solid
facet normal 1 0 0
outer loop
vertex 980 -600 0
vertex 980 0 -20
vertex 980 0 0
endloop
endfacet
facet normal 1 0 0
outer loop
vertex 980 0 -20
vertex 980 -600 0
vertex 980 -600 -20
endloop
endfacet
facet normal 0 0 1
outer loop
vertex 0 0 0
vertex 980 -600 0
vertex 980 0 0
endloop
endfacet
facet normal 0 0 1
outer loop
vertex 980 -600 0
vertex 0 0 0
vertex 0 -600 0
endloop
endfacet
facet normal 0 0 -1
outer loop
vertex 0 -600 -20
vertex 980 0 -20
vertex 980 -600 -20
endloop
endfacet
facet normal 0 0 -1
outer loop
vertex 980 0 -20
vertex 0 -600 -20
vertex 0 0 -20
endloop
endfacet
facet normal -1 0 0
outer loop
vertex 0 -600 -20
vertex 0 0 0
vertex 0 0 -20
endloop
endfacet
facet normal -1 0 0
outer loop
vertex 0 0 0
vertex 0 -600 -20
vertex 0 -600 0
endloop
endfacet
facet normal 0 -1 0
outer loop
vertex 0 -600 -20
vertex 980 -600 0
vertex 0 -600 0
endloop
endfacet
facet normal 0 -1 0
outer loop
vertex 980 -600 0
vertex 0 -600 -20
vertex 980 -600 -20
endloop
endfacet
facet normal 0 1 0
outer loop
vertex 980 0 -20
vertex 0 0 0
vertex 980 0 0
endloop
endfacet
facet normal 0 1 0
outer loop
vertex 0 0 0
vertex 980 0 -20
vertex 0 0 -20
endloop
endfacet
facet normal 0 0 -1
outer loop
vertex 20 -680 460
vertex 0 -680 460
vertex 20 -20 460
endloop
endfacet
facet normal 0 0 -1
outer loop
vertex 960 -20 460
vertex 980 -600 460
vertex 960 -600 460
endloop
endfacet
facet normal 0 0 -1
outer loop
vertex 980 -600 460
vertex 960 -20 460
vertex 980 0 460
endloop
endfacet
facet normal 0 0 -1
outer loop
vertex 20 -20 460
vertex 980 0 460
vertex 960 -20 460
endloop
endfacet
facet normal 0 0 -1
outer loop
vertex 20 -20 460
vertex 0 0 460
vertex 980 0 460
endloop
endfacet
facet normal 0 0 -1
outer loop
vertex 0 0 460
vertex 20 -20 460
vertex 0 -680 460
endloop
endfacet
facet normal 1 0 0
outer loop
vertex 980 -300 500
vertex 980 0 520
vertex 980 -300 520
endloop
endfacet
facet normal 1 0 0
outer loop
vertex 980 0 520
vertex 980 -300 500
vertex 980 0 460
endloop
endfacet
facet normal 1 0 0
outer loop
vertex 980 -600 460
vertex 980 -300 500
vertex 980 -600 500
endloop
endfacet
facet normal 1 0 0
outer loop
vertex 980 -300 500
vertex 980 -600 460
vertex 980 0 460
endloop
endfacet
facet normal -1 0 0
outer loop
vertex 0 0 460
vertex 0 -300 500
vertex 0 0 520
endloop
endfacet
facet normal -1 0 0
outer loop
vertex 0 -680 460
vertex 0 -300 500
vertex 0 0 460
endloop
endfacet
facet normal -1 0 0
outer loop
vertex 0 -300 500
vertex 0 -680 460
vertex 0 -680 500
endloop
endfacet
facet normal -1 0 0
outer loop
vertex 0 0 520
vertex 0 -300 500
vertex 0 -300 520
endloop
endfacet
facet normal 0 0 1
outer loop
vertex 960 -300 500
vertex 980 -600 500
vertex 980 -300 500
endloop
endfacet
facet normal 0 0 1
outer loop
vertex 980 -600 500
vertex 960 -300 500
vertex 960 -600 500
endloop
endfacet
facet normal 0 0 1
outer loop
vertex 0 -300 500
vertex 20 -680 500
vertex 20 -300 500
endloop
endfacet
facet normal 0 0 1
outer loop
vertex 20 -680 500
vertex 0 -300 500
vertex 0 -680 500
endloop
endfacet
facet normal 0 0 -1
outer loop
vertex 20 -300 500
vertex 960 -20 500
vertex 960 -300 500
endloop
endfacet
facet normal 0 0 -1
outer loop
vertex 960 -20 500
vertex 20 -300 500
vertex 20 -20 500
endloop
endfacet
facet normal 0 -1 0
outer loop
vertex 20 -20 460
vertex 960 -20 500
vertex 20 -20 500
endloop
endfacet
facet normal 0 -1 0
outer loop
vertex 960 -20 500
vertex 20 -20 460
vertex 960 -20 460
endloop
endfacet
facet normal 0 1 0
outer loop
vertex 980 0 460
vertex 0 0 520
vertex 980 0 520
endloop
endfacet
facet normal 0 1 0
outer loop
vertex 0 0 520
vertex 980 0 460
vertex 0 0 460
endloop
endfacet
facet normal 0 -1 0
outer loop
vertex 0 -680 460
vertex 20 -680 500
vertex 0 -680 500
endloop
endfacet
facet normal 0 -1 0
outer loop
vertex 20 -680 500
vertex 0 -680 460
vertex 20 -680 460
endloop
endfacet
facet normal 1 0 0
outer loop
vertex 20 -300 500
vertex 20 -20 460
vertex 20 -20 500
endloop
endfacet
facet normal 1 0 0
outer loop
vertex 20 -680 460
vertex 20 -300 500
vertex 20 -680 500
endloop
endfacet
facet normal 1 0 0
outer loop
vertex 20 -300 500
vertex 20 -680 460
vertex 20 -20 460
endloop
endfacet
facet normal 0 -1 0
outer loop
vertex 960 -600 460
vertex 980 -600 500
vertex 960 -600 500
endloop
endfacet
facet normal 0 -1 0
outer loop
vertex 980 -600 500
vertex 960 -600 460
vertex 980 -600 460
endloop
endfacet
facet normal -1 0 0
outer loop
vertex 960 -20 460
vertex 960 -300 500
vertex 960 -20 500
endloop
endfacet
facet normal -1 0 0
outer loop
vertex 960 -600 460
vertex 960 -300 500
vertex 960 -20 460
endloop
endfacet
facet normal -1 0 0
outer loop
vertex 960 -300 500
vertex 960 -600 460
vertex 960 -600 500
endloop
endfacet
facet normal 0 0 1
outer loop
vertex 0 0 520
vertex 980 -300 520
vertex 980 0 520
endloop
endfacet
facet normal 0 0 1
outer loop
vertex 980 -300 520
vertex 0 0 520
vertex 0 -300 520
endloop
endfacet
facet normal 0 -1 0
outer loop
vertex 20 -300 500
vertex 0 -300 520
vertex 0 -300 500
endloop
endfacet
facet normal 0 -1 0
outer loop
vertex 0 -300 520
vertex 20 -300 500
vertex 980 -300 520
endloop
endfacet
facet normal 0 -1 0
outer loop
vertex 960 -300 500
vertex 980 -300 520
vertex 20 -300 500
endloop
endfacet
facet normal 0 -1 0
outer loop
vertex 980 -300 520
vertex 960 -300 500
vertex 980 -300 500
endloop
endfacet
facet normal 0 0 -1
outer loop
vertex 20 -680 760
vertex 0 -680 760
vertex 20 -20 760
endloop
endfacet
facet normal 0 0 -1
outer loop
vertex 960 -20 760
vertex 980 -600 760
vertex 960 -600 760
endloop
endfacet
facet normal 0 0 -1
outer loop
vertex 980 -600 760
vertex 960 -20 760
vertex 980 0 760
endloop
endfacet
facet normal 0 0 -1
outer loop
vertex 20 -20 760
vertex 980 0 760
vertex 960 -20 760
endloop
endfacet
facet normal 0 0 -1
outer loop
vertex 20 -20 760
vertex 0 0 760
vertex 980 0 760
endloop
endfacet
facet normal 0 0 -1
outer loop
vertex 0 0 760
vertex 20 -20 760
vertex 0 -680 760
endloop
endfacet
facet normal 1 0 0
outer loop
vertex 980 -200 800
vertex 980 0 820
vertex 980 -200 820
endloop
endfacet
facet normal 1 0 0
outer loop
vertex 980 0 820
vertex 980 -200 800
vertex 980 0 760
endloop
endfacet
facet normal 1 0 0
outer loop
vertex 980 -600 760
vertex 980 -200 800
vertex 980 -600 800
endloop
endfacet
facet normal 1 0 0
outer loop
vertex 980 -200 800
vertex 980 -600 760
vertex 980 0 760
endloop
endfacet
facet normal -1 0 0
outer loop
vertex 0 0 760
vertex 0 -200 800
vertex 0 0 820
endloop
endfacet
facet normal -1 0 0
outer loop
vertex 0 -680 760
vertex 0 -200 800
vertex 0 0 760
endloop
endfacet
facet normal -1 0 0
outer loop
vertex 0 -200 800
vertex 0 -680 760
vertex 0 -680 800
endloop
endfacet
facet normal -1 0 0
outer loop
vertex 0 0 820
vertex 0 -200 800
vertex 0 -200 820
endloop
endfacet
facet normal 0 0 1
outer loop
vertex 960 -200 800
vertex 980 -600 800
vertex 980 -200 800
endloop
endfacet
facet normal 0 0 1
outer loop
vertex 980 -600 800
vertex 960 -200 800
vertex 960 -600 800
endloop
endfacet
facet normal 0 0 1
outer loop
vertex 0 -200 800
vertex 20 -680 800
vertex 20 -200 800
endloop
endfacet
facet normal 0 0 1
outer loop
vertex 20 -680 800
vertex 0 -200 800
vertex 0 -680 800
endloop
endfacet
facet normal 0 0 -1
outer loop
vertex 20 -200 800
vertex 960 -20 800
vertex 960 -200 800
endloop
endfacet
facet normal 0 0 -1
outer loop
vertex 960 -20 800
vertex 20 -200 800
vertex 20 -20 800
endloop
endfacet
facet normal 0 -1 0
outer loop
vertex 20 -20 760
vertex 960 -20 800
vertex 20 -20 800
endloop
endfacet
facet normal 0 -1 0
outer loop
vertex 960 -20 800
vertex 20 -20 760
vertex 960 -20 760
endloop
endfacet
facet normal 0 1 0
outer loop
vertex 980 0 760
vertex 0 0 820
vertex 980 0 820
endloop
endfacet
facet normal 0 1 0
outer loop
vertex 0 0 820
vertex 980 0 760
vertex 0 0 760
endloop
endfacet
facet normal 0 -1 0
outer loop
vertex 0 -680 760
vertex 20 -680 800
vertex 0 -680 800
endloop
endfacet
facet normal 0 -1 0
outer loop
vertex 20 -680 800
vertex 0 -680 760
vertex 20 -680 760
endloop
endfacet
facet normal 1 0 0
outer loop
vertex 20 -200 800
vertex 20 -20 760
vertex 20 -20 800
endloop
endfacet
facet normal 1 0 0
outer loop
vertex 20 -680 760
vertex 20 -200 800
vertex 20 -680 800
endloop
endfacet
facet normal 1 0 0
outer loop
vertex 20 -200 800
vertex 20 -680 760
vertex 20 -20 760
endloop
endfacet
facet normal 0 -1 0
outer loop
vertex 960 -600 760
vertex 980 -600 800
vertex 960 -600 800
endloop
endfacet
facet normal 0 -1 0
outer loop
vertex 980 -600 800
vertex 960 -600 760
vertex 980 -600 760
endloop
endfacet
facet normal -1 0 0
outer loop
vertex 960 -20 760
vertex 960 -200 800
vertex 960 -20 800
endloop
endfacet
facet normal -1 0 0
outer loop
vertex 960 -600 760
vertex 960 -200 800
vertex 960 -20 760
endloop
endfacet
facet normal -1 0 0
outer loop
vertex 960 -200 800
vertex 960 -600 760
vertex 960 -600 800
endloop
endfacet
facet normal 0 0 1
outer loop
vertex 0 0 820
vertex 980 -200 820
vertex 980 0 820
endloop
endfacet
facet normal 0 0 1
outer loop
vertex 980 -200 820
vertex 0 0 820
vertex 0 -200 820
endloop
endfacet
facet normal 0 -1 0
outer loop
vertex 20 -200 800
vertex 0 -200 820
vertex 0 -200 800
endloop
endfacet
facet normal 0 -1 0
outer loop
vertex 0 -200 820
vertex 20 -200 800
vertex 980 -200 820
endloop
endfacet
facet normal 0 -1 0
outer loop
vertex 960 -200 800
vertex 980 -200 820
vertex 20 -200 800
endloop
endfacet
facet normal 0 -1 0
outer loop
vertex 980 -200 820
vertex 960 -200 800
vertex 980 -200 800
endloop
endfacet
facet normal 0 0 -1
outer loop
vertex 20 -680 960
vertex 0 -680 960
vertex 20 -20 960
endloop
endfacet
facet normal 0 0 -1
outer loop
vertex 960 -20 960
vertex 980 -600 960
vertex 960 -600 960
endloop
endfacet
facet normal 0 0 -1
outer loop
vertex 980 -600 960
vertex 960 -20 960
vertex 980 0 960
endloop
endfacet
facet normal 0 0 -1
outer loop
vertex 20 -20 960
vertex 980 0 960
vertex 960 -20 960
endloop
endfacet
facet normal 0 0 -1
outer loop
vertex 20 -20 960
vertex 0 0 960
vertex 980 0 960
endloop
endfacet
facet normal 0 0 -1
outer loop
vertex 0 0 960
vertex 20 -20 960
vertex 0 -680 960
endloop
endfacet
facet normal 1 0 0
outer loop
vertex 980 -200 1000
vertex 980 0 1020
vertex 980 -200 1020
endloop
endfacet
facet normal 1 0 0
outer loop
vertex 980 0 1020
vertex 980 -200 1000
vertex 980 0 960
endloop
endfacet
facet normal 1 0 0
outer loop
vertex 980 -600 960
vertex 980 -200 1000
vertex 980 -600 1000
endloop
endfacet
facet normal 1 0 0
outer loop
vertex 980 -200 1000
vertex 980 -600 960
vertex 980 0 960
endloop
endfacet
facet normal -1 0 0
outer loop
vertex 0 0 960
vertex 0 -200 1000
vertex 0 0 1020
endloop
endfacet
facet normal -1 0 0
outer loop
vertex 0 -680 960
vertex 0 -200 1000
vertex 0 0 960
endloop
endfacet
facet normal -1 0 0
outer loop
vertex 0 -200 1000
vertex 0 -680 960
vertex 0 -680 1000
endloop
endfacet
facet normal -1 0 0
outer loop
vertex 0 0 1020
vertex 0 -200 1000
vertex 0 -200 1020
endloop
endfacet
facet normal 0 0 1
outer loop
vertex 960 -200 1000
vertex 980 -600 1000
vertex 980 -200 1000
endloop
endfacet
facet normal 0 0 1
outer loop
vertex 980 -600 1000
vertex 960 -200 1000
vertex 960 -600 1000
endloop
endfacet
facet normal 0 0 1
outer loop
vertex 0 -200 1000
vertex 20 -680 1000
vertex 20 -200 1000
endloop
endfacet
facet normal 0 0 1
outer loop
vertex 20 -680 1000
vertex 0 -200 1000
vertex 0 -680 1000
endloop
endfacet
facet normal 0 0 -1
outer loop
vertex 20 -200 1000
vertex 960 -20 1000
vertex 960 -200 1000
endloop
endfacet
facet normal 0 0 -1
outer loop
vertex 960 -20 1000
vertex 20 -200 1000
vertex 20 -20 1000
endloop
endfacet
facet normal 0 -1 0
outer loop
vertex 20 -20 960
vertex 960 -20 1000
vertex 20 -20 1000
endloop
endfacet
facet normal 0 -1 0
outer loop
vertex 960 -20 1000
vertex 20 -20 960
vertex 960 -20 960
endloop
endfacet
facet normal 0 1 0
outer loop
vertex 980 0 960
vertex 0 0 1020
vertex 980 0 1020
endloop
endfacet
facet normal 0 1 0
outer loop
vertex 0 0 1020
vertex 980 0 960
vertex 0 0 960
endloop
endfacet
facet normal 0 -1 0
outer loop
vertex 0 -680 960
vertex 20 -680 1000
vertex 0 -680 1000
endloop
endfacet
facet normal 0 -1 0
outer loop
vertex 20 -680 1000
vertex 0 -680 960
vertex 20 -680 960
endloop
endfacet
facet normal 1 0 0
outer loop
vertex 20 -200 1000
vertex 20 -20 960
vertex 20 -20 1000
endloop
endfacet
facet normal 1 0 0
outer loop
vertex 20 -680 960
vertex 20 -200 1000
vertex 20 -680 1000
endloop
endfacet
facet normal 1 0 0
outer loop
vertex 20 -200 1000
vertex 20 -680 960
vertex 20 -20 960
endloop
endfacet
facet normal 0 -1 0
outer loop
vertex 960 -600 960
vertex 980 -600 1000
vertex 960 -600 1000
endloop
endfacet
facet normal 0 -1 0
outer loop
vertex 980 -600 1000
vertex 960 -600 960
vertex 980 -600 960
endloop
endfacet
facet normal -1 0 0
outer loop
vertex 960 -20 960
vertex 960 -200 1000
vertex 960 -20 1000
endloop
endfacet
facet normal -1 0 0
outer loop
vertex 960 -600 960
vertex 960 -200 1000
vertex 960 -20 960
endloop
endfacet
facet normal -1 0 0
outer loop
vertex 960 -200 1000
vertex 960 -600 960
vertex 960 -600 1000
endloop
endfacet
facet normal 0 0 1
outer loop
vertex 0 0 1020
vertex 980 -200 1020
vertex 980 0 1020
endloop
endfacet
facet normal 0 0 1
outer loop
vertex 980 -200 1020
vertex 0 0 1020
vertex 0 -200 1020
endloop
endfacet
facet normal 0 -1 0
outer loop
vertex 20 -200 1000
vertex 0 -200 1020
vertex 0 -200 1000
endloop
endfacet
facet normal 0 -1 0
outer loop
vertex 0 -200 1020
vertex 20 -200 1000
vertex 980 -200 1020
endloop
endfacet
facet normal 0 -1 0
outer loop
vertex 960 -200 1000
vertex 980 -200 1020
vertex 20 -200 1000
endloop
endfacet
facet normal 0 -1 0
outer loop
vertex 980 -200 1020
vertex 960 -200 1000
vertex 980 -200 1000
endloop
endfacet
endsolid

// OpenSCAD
// file: wood.scad
$t = 20;

function odd(x) = (x % 2) == 1;

module beam(length = 1200, width = 42, depth = 42) {
	echo("beam", [length, width, depth]);
	cube([width, depth, length]);
}

module plank(length, width = 200, thickness = $t) {
	echo("plank", [length, width, thickness]);
	cube([length, width, thickness]);
}

module panel(length, width = 600, thickness = $t, backing_width = 40) {
	plank_width = width / 6;
	count = floor(width / plank_width);
	
	for (x = [0:1:count-1]) {
		color(odd(x) ? [0.8, 0.4, 0.1] : [0.7, 0.4, 0.1])
		translate([0, x * plank_width, 0]) plank(length, plank_width, thickness);
	}
}

module edged_panel(length, width = 600, thickness = $t, plank_width = 100, backing_width = 40) {
	count = floor(width / plank_width);
	
	translate([0, 0, thickness]) {
		for (x = [0:1:count-1]) {
			color(odd(x) ? [0.8, 0.4, 0.1] : [0.7, 0.4, 0.1])
			translate([0, x * plank_width, 0]) plank(length, plank_width, thickness);
		}
	}
	
	color([0.8, 0.45, 0.1])
	translate([0, 0, 0]) {
		plank(length, backing_width);
		translate([0, width - backing_width, 0]) plank(length, backing_width);
	}
	
	color([0.8, 0.35, 0.3])
	translate([0, width - backing_width, 0]) rotate([0, 0, -90]) {
		plank(width - backing_width*2, backing_width);
		translate([0, length-backing_width, 0]) plank(width - backing_width*2, backing_width);
	}
}
// main file
use <wood.scad>;

module shelf(depth=600) {
	translate([0, -depth, 0])
	panel(980, depth);
}

module support() {
	translate([0, -20])
	rotate([0, 90, 0])
	beam(980, 40, 20);
	
	rotate([0, 90, -90])
	beam(680, 40, 20);
	
	translate([980 - 20, 0, 0])
	rotate([0, 90, -90])
	beam(600, 40, 20);
}

translate([0, 0, -20]) shelf();
	
translate([0, 0, 500]) {
	support();
	rotate([0, 0, 0]) shelf(300);
}

translate([0, 0, 500+300]) {
	support();
	rotate([0, 0, 0]) shelf(200);
}

translate([0, 0, 500+300+200]) {
	support();
	shelf(200);
}
